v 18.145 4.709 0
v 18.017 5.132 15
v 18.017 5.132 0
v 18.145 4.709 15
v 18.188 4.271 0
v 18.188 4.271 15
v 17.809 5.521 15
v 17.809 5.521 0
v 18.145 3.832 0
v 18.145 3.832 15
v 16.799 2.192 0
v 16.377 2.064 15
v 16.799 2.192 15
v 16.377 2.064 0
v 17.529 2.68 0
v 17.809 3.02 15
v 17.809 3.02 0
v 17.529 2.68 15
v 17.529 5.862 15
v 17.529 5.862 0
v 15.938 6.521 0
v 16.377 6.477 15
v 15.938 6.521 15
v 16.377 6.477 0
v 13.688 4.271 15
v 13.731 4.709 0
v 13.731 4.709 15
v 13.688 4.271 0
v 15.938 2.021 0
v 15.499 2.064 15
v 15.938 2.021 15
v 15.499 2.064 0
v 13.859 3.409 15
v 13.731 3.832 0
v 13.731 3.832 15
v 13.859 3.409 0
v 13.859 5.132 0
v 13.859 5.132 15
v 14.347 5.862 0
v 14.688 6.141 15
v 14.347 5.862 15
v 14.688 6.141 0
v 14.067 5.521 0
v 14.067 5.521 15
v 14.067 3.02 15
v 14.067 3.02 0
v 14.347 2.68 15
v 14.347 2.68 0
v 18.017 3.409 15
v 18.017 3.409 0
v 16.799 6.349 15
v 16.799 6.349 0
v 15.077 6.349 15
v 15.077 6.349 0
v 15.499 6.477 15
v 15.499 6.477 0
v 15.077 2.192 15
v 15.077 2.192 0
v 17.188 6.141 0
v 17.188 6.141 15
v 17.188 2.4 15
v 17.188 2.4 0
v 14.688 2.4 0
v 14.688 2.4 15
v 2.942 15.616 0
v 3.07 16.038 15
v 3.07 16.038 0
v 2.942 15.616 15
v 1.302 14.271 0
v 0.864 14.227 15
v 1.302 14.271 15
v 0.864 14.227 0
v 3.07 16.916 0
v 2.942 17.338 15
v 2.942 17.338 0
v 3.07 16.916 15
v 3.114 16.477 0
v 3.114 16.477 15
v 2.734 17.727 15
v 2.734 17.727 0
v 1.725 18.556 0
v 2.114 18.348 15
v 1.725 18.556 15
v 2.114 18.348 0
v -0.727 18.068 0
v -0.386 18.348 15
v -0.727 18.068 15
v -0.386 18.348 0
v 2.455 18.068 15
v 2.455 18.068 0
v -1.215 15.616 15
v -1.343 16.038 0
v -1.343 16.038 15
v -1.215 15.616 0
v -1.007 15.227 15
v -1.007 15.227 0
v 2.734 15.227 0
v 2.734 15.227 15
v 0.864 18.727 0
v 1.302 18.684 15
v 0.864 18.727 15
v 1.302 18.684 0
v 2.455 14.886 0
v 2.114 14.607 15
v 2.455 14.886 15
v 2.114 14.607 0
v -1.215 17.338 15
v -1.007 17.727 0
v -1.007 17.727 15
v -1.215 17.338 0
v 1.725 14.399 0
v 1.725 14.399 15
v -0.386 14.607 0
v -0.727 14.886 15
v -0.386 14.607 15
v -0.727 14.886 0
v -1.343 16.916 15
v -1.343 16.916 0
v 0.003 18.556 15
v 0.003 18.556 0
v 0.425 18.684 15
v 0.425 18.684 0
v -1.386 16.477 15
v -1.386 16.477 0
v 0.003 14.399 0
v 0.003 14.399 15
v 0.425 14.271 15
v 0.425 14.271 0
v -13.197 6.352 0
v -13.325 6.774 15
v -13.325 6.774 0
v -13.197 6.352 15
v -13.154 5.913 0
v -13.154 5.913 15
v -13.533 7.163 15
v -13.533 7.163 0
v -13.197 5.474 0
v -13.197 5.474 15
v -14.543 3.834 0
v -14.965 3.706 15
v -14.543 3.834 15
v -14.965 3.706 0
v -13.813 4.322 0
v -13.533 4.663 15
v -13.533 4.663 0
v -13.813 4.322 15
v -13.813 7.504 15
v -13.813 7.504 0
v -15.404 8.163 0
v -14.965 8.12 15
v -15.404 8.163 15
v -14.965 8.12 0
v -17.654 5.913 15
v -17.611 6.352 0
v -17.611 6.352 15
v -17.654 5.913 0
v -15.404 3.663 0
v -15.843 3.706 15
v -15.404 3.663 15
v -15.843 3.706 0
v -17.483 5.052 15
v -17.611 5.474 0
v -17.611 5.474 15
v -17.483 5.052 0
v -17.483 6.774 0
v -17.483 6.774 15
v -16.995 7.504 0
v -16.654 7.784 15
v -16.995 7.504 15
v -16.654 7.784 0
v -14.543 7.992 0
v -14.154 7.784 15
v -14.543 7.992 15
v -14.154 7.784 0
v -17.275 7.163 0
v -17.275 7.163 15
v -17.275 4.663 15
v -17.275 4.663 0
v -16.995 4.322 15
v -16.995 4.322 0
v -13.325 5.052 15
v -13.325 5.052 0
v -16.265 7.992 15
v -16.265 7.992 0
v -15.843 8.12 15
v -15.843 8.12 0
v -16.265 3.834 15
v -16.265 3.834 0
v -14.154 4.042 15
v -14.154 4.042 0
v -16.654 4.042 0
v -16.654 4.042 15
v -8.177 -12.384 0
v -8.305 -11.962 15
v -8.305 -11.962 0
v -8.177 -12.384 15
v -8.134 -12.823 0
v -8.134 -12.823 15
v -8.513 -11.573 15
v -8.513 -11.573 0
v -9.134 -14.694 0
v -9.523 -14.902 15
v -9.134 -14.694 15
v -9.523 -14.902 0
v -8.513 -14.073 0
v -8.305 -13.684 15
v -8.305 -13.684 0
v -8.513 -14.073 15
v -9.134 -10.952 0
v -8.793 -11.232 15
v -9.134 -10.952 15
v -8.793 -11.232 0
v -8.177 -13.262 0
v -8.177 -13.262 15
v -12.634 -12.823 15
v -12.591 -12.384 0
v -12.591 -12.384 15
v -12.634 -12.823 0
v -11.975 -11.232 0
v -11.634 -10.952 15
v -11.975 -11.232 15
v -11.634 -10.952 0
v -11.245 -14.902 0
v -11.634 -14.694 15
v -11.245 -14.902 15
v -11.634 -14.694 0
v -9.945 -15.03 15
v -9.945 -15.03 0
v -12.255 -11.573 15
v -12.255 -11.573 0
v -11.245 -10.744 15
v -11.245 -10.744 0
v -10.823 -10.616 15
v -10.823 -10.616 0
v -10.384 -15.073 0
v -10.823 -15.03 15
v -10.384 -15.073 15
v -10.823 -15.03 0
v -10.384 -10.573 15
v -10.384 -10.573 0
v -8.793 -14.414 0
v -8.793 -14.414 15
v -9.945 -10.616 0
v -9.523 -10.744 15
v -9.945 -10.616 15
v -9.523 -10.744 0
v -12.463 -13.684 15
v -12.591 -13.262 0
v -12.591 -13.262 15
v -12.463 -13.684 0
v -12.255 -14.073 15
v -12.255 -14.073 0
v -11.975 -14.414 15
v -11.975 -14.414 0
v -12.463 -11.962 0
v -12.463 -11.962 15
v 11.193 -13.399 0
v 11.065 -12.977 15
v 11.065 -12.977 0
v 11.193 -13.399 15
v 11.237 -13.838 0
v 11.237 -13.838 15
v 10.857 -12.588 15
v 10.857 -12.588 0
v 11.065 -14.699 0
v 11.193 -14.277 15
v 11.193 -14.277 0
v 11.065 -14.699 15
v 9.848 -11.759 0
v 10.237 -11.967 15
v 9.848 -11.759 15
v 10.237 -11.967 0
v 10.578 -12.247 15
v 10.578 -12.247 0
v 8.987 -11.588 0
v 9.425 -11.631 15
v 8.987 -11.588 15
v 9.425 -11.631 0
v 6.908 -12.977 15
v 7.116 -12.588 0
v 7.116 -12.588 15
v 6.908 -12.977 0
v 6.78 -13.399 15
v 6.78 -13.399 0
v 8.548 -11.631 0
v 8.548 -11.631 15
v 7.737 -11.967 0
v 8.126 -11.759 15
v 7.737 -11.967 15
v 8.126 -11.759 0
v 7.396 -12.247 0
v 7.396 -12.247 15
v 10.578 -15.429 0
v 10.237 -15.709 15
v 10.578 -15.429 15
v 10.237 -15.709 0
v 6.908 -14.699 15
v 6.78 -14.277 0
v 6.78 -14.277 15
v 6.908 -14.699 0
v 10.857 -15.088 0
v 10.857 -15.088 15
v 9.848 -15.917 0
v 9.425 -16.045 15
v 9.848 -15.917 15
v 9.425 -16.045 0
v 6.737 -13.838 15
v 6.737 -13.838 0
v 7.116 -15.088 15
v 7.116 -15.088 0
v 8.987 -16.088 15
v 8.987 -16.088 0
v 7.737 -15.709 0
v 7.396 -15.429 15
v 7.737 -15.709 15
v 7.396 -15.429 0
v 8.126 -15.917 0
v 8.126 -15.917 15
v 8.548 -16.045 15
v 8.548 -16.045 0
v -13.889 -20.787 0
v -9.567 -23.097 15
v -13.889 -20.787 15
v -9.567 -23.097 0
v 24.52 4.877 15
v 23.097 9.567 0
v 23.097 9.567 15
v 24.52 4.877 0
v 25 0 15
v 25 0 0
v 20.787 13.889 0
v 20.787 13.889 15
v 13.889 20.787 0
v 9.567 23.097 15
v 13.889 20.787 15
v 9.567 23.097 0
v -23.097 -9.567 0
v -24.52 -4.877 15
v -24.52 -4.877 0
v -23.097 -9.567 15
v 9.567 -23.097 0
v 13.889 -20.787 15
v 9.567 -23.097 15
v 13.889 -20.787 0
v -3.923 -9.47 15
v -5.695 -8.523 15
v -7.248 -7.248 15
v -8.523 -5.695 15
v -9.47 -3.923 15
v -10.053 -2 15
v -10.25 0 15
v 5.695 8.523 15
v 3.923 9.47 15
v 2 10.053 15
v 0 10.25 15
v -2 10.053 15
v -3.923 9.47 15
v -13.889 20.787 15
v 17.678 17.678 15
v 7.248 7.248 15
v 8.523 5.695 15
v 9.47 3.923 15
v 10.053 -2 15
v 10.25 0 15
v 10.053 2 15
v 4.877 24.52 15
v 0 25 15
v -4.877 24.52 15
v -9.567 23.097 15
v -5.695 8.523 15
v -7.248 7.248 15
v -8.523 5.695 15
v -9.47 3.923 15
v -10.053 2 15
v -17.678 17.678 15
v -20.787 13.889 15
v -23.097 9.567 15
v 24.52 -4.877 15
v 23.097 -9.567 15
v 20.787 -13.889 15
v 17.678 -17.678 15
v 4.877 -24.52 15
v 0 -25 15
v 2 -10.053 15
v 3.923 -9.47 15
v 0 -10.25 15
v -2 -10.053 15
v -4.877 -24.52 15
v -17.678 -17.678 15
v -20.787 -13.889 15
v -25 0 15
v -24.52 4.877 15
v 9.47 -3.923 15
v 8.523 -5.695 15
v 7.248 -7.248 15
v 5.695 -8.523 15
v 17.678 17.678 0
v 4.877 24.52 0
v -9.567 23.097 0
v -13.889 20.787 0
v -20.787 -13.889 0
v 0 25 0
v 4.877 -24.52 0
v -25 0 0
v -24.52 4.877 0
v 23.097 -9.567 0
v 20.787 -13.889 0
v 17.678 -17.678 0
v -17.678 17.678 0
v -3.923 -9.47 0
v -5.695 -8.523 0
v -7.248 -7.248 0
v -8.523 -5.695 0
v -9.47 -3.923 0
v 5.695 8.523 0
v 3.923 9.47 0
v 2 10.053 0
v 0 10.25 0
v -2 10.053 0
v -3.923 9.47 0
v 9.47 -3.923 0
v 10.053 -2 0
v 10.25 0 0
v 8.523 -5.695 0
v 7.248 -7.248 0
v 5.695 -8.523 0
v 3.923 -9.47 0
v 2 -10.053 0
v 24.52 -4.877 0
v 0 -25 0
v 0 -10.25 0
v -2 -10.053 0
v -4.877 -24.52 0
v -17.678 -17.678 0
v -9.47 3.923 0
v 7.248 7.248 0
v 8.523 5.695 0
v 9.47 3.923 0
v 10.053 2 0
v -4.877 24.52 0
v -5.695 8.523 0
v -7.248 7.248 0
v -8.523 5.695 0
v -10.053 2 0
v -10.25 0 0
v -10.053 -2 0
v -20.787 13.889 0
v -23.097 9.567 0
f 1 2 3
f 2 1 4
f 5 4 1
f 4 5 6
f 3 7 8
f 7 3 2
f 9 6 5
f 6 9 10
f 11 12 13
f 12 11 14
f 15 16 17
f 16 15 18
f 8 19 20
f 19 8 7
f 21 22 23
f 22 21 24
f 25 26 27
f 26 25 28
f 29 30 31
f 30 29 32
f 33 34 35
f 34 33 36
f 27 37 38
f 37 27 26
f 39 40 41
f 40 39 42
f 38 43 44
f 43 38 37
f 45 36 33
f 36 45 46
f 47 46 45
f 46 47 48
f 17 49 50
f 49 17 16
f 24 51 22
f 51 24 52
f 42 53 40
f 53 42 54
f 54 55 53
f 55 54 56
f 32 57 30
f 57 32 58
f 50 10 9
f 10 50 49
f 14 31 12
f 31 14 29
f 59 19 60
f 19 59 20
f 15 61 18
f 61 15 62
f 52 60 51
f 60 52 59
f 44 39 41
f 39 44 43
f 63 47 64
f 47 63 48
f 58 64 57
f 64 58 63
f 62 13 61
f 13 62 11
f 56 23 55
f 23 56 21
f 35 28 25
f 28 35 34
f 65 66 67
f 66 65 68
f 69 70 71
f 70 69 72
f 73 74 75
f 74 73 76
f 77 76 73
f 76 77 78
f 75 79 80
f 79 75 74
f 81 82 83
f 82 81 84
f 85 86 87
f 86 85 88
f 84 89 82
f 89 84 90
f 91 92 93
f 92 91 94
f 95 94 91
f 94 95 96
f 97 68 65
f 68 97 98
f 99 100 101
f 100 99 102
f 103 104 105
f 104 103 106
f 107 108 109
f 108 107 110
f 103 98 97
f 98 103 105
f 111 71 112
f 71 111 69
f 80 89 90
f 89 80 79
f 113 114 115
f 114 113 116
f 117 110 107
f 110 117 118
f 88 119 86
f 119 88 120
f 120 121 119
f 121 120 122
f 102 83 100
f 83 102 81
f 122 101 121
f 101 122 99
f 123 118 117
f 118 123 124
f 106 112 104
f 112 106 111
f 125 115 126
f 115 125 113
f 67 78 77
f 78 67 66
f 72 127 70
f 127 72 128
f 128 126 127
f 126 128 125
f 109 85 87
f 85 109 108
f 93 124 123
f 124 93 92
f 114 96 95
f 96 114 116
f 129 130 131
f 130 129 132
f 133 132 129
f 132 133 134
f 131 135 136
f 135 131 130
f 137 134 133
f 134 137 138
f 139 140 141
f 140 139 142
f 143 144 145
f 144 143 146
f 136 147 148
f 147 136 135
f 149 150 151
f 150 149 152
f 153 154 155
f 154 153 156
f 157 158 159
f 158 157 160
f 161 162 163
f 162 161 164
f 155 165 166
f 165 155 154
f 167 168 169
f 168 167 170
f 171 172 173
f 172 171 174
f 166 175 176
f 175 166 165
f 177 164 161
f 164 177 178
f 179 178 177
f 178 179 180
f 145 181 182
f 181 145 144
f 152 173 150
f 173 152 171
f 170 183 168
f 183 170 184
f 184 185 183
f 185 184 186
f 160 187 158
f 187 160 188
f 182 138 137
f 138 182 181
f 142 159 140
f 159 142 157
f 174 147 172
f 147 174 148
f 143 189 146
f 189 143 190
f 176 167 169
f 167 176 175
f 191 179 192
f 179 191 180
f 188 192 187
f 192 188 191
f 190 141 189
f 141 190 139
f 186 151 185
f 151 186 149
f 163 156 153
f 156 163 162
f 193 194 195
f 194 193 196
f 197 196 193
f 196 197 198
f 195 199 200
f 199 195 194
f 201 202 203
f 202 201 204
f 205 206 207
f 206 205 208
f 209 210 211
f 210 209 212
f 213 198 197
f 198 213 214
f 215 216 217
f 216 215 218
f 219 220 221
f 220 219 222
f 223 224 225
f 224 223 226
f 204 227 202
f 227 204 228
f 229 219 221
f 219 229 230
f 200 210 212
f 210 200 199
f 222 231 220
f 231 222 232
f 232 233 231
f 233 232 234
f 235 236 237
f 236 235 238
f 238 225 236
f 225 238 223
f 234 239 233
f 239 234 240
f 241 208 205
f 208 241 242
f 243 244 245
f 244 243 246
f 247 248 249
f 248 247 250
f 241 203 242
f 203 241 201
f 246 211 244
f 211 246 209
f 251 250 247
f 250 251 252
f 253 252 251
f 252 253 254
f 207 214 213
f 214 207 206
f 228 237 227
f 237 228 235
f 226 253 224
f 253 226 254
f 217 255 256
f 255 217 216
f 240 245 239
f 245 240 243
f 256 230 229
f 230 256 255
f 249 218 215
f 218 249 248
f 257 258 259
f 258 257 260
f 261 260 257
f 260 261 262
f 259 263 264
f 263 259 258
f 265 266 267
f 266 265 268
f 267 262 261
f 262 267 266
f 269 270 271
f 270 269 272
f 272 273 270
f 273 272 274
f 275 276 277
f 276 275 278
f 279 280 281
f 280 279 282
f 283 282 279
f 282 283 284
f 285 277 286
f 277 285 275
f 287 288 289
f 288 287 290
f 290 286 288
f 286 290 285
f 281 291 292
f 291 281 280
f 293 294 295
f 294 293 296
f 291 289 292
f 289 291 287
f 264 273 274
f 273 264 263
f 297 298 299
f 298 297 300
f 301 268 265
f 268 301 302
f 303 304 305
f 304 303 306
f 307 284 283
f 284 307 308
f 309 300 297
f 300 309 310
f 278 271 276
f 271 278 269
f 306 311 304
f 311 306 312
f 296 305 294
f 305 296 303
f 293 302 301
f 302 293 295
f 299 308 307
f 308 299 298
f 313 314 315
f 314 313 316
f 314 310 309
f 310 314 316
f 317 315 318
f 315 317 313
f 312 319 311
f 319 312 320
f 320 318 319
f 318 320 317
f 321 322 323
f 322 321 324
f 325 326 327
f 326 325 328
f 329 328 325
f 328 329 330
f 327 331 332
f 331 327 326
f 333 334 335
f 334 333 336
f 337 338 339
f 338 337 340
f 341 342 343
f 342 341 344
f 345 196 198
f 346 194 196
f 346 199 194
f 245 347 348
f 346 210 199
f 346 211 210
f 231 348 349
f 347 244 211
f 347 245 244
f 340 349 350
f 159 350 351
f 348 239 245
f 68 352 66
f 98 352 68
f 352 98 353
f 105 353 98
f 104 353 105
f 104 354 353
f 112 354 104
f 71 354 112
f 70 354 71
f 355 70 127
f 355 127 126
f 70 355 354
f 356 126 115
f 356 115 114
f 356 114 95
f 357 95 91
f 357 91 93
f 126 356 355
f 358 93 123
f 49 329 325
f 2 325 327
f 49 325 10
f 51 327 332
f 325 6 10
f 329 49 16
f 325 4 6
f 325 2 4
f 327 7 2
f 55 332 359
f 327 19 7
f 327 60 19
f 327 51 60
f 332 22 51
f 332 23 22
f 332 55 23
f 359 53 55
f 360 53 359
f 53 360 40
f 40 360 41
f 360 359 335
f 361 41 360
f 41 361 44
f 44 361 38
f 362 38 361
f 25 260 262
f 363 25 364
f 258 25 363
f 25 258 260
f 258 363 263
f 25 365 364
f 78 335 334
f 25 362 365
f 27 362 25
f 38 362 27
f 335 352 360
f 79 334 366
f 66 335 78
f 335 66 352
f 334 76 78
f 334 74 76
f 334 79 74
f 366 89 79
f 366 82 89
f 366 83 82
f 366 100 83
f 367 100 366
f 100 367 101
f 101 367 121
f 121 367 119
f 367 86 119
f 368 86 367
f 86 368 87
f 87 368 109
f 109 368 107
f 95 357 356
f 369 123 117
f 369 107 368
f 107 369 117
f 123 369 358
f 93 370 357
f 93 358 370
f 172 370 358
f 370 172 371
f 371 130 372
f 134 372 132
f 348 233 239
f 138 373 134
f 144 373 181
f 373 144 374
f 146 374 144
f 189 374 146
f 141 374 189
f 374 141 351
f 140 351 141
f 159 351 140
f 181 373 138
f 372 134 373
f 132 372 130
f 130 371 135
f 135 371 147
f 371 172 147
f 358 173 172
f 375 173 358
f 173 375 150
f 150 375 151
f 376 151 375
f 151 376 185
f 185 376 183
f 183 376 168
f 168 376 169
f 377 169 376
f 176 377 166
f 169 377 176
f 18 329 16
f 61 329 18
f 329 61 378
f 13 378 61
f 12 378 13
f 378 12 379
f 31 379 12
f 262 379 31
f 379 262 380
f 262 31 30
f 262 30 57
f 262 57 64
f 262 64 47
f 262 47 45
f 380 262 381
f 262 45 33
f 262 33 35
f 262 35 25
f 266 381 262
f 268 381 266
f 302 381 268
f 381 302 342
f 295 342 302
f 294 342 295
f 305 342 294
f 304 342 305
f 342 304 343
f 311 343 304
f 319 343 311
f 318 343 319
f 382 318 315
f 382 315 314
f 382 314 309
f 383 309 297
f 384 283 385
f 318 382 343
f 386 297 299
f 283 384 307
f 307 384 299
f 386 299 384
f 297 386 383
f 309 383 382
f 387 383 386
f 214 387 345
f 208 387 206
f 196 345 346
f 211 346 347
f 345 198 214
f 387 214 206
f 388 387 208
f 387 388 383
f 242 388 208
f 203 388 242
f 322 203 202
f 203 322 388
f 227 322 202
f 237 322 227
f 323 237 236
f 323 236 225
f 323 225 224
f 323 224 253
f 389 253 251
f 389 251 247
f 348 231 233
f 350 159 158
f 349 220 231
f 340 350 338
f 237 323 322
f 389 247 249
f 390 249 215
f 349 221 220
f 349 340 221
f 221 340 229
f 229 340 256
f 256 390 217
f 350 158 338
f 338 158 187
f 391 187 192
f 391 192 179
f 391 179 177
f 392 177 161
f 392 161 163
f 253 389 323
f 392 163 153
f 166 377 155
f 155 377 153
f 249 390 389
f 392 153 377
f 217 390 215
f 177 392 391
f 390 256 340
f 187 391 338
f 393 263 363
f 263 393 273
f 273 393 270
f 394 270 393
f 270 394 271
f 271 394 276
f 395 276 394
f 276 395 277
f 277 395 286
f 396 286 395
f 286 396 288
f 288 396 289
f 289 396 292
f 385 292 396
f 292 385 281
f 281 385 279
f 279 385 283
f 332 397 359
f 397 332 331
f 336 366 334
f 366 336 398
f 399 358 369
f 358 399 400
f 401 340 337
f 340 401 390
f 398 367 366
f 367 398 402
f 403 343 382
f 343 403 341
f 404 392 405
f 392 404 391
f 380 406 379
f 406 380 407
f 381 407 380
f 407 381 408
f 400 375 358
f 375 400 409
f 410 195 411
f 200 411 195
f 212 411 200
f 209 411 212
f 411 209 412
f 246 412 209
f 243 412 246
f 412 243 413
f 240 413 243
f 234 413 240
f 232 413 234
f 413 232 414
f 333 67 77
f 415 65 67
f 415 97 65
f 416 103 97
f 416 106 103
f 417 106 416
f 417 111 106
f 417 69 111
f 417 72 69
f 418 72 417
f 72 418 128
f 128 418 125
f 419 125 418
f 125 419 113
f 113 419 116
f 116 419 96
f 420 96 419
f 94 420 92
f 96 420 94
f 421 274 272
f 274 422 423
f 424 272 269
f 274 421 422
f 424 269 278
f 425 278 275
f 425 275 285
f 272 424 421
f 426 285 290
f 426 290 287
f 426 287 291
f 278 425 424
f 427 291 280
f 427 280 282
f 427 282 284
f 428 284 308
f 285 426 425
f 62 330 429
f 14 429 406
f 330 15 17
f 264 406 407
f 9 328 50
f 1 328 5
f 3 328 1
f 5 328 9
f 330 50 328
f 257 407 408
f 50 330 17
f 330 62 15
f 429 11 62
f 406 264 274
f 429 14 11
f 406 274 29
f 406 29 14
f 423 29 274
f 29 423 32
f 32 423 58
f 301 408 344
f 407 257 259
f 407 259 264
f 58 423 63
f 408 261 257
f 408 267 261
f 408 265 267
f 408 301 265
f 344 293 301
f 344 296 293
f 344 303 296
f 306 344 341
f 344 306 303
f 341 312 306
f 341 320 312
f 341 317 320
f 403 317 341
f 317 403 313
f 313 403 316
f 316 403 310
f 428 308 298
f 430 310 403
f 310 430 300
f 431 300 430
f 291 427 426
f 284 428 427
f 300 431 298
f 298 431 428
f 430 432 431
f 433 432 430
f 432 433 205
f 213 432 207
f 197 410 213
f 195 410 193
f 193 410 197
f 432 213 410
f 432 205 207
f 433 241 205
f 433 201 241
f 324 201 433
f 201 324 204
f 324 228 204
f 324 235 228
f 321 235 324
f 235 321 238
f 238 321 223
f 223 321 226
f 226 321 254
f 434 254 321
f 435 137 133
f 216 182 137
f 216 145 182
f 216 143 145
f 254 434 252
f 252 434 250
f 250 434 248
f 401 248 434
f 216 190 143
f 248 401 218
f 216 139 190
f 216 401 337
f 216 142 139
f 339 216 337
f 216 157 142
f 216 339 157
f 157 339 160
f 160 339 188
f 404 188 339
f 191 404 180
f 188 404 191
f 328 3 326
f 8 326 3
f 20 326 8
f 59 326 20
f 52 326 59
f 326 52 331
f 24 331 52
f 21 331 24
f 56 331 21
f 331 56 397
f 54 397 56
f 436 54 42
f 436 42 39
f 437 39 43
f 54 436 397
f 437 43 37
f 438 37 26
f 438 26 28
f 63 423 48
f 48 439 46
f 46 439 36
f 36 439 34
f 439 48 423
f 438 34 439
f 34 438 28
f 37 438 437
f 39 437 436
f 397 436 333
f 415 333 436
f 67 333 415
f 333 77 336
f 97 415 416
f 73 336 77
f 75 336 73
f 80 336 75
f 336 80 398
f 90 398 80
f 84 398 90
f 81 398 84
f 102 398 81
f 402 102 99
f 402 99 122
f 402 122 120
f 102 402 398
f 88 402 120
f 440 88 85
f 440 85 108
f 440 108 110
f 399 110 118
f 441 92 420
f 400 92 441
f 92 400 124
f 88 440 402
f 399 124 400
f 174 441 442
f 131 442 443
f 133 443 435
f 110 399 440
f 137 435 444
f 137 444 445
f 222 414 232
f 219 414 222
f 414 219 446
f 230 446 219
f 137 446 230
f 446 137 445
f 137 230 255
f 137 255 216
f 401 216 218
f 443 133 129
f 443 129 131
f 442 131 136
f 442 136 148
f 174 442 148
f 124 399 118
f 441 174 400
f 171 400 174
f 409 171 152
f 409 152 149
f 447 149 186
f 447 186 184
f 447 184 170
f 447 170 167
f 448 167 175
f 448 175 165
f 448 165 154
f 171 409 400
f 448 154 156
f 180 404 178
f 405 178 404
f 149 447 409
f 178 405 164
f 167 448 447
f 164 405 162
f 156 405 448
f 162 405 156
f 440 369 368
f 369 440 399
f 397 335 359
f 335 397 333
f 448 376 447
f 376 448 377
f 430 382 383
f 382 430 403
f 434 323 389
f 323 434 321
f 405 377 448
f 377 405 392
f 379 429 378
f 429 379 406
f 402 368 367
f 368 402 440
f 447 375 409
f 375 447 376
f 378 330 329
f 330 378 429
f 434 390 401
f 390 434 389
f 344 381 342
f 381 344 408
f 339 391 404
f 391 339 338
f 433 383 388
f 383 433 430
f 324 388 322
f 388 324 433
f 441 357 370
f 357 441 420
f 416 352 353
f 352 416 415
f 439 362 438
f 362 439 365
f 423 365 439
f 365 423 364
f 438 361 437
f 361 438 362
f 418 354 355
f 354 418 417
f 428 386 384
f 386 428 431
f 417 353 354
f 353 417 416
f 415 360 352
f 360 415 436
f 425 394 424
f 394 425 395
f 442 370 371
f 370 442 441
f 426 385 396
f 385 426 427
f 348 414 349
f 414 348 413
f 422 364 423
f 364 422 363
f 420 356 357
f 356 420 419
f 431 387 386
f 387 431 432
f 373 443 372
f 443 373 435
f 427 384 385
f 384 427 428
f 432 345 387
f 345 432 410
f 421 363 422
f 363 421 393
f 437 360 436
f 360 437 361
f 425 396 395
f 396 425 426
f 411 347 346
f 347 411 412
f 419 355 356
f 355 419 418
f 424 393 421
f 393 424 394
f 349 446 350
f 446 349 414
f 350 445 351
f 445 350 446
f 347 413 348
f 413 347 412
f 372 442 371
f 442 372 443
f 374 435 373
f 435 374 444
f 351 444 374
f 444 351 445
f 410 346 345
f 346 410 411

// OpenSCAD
$fn = 32;

// ----------------------------------------------------------------------
// Flange Ø50 x 15
// 5 holes on a Ø33 bolt circle, bolted joints
// ----------------------------------------------------------------------

// --- parameters (mm) ---
flange_d = 50;   // outside diameter of the flange
thickness = 15;  // flange thickness
holes = 5;       // number of bolt holes
pcd = 33;        // bolt circle diameter
start_deg = 15;  // angle of the first hole, from +X
hole_d = 4.5;    // bolt hole diameter
bore_d = 20.5;   // central through bore
hub_d = 28.5;    // hub outside diameter
hub_h = 0;       // hub height above the flange face (0 = no hub)

// --- derived feature positions (mm) ---
height = thickness + hub_h;  // = 15   overall height of the part
pcd_r = pcd / 2;             // = 16.5   bolt circle radius
hole_step = 360 / holes;     // = 72   angular pitch
feature_centers = [
  [pcd_r * cos(start_deg + 0 * hole_step), pcd_r * sin(start_deg + 0 * hole_step)],
  [pcd_r * cos(start_deg + 1 * hole_step), pcd_r * sin(start_deg + 1 * hole_step)],
  [pcd_r * cos(start_deg + 2 * hole_step), pcd_r * sin(start_deg + 2 * hole_step)],
  [pcd_r * cos(start_deg + 3 * hole_step), pcd_r * sin(start_deg + 3 * hole_step)],
  [pcd_r * cos(start_deg + 4 * hole_step), pcd_r * sin(start_deg + 4 * hole_step)]
];   // bolt hole centres on the pitch circle

// flange disc, every hole and the bore cut straight through
difference() {
  union() {
    cylinder(d = flange_d, h = thickness);
  }
  translate([0, 0, -1]) cylinder(d = bore_d, h = height + 2);  // bore, through
  for (centre = feature_centers)
    translate([centre[0], centre[1], -1]) cylinder(d = hole_d, h = thickness + 2);
}
